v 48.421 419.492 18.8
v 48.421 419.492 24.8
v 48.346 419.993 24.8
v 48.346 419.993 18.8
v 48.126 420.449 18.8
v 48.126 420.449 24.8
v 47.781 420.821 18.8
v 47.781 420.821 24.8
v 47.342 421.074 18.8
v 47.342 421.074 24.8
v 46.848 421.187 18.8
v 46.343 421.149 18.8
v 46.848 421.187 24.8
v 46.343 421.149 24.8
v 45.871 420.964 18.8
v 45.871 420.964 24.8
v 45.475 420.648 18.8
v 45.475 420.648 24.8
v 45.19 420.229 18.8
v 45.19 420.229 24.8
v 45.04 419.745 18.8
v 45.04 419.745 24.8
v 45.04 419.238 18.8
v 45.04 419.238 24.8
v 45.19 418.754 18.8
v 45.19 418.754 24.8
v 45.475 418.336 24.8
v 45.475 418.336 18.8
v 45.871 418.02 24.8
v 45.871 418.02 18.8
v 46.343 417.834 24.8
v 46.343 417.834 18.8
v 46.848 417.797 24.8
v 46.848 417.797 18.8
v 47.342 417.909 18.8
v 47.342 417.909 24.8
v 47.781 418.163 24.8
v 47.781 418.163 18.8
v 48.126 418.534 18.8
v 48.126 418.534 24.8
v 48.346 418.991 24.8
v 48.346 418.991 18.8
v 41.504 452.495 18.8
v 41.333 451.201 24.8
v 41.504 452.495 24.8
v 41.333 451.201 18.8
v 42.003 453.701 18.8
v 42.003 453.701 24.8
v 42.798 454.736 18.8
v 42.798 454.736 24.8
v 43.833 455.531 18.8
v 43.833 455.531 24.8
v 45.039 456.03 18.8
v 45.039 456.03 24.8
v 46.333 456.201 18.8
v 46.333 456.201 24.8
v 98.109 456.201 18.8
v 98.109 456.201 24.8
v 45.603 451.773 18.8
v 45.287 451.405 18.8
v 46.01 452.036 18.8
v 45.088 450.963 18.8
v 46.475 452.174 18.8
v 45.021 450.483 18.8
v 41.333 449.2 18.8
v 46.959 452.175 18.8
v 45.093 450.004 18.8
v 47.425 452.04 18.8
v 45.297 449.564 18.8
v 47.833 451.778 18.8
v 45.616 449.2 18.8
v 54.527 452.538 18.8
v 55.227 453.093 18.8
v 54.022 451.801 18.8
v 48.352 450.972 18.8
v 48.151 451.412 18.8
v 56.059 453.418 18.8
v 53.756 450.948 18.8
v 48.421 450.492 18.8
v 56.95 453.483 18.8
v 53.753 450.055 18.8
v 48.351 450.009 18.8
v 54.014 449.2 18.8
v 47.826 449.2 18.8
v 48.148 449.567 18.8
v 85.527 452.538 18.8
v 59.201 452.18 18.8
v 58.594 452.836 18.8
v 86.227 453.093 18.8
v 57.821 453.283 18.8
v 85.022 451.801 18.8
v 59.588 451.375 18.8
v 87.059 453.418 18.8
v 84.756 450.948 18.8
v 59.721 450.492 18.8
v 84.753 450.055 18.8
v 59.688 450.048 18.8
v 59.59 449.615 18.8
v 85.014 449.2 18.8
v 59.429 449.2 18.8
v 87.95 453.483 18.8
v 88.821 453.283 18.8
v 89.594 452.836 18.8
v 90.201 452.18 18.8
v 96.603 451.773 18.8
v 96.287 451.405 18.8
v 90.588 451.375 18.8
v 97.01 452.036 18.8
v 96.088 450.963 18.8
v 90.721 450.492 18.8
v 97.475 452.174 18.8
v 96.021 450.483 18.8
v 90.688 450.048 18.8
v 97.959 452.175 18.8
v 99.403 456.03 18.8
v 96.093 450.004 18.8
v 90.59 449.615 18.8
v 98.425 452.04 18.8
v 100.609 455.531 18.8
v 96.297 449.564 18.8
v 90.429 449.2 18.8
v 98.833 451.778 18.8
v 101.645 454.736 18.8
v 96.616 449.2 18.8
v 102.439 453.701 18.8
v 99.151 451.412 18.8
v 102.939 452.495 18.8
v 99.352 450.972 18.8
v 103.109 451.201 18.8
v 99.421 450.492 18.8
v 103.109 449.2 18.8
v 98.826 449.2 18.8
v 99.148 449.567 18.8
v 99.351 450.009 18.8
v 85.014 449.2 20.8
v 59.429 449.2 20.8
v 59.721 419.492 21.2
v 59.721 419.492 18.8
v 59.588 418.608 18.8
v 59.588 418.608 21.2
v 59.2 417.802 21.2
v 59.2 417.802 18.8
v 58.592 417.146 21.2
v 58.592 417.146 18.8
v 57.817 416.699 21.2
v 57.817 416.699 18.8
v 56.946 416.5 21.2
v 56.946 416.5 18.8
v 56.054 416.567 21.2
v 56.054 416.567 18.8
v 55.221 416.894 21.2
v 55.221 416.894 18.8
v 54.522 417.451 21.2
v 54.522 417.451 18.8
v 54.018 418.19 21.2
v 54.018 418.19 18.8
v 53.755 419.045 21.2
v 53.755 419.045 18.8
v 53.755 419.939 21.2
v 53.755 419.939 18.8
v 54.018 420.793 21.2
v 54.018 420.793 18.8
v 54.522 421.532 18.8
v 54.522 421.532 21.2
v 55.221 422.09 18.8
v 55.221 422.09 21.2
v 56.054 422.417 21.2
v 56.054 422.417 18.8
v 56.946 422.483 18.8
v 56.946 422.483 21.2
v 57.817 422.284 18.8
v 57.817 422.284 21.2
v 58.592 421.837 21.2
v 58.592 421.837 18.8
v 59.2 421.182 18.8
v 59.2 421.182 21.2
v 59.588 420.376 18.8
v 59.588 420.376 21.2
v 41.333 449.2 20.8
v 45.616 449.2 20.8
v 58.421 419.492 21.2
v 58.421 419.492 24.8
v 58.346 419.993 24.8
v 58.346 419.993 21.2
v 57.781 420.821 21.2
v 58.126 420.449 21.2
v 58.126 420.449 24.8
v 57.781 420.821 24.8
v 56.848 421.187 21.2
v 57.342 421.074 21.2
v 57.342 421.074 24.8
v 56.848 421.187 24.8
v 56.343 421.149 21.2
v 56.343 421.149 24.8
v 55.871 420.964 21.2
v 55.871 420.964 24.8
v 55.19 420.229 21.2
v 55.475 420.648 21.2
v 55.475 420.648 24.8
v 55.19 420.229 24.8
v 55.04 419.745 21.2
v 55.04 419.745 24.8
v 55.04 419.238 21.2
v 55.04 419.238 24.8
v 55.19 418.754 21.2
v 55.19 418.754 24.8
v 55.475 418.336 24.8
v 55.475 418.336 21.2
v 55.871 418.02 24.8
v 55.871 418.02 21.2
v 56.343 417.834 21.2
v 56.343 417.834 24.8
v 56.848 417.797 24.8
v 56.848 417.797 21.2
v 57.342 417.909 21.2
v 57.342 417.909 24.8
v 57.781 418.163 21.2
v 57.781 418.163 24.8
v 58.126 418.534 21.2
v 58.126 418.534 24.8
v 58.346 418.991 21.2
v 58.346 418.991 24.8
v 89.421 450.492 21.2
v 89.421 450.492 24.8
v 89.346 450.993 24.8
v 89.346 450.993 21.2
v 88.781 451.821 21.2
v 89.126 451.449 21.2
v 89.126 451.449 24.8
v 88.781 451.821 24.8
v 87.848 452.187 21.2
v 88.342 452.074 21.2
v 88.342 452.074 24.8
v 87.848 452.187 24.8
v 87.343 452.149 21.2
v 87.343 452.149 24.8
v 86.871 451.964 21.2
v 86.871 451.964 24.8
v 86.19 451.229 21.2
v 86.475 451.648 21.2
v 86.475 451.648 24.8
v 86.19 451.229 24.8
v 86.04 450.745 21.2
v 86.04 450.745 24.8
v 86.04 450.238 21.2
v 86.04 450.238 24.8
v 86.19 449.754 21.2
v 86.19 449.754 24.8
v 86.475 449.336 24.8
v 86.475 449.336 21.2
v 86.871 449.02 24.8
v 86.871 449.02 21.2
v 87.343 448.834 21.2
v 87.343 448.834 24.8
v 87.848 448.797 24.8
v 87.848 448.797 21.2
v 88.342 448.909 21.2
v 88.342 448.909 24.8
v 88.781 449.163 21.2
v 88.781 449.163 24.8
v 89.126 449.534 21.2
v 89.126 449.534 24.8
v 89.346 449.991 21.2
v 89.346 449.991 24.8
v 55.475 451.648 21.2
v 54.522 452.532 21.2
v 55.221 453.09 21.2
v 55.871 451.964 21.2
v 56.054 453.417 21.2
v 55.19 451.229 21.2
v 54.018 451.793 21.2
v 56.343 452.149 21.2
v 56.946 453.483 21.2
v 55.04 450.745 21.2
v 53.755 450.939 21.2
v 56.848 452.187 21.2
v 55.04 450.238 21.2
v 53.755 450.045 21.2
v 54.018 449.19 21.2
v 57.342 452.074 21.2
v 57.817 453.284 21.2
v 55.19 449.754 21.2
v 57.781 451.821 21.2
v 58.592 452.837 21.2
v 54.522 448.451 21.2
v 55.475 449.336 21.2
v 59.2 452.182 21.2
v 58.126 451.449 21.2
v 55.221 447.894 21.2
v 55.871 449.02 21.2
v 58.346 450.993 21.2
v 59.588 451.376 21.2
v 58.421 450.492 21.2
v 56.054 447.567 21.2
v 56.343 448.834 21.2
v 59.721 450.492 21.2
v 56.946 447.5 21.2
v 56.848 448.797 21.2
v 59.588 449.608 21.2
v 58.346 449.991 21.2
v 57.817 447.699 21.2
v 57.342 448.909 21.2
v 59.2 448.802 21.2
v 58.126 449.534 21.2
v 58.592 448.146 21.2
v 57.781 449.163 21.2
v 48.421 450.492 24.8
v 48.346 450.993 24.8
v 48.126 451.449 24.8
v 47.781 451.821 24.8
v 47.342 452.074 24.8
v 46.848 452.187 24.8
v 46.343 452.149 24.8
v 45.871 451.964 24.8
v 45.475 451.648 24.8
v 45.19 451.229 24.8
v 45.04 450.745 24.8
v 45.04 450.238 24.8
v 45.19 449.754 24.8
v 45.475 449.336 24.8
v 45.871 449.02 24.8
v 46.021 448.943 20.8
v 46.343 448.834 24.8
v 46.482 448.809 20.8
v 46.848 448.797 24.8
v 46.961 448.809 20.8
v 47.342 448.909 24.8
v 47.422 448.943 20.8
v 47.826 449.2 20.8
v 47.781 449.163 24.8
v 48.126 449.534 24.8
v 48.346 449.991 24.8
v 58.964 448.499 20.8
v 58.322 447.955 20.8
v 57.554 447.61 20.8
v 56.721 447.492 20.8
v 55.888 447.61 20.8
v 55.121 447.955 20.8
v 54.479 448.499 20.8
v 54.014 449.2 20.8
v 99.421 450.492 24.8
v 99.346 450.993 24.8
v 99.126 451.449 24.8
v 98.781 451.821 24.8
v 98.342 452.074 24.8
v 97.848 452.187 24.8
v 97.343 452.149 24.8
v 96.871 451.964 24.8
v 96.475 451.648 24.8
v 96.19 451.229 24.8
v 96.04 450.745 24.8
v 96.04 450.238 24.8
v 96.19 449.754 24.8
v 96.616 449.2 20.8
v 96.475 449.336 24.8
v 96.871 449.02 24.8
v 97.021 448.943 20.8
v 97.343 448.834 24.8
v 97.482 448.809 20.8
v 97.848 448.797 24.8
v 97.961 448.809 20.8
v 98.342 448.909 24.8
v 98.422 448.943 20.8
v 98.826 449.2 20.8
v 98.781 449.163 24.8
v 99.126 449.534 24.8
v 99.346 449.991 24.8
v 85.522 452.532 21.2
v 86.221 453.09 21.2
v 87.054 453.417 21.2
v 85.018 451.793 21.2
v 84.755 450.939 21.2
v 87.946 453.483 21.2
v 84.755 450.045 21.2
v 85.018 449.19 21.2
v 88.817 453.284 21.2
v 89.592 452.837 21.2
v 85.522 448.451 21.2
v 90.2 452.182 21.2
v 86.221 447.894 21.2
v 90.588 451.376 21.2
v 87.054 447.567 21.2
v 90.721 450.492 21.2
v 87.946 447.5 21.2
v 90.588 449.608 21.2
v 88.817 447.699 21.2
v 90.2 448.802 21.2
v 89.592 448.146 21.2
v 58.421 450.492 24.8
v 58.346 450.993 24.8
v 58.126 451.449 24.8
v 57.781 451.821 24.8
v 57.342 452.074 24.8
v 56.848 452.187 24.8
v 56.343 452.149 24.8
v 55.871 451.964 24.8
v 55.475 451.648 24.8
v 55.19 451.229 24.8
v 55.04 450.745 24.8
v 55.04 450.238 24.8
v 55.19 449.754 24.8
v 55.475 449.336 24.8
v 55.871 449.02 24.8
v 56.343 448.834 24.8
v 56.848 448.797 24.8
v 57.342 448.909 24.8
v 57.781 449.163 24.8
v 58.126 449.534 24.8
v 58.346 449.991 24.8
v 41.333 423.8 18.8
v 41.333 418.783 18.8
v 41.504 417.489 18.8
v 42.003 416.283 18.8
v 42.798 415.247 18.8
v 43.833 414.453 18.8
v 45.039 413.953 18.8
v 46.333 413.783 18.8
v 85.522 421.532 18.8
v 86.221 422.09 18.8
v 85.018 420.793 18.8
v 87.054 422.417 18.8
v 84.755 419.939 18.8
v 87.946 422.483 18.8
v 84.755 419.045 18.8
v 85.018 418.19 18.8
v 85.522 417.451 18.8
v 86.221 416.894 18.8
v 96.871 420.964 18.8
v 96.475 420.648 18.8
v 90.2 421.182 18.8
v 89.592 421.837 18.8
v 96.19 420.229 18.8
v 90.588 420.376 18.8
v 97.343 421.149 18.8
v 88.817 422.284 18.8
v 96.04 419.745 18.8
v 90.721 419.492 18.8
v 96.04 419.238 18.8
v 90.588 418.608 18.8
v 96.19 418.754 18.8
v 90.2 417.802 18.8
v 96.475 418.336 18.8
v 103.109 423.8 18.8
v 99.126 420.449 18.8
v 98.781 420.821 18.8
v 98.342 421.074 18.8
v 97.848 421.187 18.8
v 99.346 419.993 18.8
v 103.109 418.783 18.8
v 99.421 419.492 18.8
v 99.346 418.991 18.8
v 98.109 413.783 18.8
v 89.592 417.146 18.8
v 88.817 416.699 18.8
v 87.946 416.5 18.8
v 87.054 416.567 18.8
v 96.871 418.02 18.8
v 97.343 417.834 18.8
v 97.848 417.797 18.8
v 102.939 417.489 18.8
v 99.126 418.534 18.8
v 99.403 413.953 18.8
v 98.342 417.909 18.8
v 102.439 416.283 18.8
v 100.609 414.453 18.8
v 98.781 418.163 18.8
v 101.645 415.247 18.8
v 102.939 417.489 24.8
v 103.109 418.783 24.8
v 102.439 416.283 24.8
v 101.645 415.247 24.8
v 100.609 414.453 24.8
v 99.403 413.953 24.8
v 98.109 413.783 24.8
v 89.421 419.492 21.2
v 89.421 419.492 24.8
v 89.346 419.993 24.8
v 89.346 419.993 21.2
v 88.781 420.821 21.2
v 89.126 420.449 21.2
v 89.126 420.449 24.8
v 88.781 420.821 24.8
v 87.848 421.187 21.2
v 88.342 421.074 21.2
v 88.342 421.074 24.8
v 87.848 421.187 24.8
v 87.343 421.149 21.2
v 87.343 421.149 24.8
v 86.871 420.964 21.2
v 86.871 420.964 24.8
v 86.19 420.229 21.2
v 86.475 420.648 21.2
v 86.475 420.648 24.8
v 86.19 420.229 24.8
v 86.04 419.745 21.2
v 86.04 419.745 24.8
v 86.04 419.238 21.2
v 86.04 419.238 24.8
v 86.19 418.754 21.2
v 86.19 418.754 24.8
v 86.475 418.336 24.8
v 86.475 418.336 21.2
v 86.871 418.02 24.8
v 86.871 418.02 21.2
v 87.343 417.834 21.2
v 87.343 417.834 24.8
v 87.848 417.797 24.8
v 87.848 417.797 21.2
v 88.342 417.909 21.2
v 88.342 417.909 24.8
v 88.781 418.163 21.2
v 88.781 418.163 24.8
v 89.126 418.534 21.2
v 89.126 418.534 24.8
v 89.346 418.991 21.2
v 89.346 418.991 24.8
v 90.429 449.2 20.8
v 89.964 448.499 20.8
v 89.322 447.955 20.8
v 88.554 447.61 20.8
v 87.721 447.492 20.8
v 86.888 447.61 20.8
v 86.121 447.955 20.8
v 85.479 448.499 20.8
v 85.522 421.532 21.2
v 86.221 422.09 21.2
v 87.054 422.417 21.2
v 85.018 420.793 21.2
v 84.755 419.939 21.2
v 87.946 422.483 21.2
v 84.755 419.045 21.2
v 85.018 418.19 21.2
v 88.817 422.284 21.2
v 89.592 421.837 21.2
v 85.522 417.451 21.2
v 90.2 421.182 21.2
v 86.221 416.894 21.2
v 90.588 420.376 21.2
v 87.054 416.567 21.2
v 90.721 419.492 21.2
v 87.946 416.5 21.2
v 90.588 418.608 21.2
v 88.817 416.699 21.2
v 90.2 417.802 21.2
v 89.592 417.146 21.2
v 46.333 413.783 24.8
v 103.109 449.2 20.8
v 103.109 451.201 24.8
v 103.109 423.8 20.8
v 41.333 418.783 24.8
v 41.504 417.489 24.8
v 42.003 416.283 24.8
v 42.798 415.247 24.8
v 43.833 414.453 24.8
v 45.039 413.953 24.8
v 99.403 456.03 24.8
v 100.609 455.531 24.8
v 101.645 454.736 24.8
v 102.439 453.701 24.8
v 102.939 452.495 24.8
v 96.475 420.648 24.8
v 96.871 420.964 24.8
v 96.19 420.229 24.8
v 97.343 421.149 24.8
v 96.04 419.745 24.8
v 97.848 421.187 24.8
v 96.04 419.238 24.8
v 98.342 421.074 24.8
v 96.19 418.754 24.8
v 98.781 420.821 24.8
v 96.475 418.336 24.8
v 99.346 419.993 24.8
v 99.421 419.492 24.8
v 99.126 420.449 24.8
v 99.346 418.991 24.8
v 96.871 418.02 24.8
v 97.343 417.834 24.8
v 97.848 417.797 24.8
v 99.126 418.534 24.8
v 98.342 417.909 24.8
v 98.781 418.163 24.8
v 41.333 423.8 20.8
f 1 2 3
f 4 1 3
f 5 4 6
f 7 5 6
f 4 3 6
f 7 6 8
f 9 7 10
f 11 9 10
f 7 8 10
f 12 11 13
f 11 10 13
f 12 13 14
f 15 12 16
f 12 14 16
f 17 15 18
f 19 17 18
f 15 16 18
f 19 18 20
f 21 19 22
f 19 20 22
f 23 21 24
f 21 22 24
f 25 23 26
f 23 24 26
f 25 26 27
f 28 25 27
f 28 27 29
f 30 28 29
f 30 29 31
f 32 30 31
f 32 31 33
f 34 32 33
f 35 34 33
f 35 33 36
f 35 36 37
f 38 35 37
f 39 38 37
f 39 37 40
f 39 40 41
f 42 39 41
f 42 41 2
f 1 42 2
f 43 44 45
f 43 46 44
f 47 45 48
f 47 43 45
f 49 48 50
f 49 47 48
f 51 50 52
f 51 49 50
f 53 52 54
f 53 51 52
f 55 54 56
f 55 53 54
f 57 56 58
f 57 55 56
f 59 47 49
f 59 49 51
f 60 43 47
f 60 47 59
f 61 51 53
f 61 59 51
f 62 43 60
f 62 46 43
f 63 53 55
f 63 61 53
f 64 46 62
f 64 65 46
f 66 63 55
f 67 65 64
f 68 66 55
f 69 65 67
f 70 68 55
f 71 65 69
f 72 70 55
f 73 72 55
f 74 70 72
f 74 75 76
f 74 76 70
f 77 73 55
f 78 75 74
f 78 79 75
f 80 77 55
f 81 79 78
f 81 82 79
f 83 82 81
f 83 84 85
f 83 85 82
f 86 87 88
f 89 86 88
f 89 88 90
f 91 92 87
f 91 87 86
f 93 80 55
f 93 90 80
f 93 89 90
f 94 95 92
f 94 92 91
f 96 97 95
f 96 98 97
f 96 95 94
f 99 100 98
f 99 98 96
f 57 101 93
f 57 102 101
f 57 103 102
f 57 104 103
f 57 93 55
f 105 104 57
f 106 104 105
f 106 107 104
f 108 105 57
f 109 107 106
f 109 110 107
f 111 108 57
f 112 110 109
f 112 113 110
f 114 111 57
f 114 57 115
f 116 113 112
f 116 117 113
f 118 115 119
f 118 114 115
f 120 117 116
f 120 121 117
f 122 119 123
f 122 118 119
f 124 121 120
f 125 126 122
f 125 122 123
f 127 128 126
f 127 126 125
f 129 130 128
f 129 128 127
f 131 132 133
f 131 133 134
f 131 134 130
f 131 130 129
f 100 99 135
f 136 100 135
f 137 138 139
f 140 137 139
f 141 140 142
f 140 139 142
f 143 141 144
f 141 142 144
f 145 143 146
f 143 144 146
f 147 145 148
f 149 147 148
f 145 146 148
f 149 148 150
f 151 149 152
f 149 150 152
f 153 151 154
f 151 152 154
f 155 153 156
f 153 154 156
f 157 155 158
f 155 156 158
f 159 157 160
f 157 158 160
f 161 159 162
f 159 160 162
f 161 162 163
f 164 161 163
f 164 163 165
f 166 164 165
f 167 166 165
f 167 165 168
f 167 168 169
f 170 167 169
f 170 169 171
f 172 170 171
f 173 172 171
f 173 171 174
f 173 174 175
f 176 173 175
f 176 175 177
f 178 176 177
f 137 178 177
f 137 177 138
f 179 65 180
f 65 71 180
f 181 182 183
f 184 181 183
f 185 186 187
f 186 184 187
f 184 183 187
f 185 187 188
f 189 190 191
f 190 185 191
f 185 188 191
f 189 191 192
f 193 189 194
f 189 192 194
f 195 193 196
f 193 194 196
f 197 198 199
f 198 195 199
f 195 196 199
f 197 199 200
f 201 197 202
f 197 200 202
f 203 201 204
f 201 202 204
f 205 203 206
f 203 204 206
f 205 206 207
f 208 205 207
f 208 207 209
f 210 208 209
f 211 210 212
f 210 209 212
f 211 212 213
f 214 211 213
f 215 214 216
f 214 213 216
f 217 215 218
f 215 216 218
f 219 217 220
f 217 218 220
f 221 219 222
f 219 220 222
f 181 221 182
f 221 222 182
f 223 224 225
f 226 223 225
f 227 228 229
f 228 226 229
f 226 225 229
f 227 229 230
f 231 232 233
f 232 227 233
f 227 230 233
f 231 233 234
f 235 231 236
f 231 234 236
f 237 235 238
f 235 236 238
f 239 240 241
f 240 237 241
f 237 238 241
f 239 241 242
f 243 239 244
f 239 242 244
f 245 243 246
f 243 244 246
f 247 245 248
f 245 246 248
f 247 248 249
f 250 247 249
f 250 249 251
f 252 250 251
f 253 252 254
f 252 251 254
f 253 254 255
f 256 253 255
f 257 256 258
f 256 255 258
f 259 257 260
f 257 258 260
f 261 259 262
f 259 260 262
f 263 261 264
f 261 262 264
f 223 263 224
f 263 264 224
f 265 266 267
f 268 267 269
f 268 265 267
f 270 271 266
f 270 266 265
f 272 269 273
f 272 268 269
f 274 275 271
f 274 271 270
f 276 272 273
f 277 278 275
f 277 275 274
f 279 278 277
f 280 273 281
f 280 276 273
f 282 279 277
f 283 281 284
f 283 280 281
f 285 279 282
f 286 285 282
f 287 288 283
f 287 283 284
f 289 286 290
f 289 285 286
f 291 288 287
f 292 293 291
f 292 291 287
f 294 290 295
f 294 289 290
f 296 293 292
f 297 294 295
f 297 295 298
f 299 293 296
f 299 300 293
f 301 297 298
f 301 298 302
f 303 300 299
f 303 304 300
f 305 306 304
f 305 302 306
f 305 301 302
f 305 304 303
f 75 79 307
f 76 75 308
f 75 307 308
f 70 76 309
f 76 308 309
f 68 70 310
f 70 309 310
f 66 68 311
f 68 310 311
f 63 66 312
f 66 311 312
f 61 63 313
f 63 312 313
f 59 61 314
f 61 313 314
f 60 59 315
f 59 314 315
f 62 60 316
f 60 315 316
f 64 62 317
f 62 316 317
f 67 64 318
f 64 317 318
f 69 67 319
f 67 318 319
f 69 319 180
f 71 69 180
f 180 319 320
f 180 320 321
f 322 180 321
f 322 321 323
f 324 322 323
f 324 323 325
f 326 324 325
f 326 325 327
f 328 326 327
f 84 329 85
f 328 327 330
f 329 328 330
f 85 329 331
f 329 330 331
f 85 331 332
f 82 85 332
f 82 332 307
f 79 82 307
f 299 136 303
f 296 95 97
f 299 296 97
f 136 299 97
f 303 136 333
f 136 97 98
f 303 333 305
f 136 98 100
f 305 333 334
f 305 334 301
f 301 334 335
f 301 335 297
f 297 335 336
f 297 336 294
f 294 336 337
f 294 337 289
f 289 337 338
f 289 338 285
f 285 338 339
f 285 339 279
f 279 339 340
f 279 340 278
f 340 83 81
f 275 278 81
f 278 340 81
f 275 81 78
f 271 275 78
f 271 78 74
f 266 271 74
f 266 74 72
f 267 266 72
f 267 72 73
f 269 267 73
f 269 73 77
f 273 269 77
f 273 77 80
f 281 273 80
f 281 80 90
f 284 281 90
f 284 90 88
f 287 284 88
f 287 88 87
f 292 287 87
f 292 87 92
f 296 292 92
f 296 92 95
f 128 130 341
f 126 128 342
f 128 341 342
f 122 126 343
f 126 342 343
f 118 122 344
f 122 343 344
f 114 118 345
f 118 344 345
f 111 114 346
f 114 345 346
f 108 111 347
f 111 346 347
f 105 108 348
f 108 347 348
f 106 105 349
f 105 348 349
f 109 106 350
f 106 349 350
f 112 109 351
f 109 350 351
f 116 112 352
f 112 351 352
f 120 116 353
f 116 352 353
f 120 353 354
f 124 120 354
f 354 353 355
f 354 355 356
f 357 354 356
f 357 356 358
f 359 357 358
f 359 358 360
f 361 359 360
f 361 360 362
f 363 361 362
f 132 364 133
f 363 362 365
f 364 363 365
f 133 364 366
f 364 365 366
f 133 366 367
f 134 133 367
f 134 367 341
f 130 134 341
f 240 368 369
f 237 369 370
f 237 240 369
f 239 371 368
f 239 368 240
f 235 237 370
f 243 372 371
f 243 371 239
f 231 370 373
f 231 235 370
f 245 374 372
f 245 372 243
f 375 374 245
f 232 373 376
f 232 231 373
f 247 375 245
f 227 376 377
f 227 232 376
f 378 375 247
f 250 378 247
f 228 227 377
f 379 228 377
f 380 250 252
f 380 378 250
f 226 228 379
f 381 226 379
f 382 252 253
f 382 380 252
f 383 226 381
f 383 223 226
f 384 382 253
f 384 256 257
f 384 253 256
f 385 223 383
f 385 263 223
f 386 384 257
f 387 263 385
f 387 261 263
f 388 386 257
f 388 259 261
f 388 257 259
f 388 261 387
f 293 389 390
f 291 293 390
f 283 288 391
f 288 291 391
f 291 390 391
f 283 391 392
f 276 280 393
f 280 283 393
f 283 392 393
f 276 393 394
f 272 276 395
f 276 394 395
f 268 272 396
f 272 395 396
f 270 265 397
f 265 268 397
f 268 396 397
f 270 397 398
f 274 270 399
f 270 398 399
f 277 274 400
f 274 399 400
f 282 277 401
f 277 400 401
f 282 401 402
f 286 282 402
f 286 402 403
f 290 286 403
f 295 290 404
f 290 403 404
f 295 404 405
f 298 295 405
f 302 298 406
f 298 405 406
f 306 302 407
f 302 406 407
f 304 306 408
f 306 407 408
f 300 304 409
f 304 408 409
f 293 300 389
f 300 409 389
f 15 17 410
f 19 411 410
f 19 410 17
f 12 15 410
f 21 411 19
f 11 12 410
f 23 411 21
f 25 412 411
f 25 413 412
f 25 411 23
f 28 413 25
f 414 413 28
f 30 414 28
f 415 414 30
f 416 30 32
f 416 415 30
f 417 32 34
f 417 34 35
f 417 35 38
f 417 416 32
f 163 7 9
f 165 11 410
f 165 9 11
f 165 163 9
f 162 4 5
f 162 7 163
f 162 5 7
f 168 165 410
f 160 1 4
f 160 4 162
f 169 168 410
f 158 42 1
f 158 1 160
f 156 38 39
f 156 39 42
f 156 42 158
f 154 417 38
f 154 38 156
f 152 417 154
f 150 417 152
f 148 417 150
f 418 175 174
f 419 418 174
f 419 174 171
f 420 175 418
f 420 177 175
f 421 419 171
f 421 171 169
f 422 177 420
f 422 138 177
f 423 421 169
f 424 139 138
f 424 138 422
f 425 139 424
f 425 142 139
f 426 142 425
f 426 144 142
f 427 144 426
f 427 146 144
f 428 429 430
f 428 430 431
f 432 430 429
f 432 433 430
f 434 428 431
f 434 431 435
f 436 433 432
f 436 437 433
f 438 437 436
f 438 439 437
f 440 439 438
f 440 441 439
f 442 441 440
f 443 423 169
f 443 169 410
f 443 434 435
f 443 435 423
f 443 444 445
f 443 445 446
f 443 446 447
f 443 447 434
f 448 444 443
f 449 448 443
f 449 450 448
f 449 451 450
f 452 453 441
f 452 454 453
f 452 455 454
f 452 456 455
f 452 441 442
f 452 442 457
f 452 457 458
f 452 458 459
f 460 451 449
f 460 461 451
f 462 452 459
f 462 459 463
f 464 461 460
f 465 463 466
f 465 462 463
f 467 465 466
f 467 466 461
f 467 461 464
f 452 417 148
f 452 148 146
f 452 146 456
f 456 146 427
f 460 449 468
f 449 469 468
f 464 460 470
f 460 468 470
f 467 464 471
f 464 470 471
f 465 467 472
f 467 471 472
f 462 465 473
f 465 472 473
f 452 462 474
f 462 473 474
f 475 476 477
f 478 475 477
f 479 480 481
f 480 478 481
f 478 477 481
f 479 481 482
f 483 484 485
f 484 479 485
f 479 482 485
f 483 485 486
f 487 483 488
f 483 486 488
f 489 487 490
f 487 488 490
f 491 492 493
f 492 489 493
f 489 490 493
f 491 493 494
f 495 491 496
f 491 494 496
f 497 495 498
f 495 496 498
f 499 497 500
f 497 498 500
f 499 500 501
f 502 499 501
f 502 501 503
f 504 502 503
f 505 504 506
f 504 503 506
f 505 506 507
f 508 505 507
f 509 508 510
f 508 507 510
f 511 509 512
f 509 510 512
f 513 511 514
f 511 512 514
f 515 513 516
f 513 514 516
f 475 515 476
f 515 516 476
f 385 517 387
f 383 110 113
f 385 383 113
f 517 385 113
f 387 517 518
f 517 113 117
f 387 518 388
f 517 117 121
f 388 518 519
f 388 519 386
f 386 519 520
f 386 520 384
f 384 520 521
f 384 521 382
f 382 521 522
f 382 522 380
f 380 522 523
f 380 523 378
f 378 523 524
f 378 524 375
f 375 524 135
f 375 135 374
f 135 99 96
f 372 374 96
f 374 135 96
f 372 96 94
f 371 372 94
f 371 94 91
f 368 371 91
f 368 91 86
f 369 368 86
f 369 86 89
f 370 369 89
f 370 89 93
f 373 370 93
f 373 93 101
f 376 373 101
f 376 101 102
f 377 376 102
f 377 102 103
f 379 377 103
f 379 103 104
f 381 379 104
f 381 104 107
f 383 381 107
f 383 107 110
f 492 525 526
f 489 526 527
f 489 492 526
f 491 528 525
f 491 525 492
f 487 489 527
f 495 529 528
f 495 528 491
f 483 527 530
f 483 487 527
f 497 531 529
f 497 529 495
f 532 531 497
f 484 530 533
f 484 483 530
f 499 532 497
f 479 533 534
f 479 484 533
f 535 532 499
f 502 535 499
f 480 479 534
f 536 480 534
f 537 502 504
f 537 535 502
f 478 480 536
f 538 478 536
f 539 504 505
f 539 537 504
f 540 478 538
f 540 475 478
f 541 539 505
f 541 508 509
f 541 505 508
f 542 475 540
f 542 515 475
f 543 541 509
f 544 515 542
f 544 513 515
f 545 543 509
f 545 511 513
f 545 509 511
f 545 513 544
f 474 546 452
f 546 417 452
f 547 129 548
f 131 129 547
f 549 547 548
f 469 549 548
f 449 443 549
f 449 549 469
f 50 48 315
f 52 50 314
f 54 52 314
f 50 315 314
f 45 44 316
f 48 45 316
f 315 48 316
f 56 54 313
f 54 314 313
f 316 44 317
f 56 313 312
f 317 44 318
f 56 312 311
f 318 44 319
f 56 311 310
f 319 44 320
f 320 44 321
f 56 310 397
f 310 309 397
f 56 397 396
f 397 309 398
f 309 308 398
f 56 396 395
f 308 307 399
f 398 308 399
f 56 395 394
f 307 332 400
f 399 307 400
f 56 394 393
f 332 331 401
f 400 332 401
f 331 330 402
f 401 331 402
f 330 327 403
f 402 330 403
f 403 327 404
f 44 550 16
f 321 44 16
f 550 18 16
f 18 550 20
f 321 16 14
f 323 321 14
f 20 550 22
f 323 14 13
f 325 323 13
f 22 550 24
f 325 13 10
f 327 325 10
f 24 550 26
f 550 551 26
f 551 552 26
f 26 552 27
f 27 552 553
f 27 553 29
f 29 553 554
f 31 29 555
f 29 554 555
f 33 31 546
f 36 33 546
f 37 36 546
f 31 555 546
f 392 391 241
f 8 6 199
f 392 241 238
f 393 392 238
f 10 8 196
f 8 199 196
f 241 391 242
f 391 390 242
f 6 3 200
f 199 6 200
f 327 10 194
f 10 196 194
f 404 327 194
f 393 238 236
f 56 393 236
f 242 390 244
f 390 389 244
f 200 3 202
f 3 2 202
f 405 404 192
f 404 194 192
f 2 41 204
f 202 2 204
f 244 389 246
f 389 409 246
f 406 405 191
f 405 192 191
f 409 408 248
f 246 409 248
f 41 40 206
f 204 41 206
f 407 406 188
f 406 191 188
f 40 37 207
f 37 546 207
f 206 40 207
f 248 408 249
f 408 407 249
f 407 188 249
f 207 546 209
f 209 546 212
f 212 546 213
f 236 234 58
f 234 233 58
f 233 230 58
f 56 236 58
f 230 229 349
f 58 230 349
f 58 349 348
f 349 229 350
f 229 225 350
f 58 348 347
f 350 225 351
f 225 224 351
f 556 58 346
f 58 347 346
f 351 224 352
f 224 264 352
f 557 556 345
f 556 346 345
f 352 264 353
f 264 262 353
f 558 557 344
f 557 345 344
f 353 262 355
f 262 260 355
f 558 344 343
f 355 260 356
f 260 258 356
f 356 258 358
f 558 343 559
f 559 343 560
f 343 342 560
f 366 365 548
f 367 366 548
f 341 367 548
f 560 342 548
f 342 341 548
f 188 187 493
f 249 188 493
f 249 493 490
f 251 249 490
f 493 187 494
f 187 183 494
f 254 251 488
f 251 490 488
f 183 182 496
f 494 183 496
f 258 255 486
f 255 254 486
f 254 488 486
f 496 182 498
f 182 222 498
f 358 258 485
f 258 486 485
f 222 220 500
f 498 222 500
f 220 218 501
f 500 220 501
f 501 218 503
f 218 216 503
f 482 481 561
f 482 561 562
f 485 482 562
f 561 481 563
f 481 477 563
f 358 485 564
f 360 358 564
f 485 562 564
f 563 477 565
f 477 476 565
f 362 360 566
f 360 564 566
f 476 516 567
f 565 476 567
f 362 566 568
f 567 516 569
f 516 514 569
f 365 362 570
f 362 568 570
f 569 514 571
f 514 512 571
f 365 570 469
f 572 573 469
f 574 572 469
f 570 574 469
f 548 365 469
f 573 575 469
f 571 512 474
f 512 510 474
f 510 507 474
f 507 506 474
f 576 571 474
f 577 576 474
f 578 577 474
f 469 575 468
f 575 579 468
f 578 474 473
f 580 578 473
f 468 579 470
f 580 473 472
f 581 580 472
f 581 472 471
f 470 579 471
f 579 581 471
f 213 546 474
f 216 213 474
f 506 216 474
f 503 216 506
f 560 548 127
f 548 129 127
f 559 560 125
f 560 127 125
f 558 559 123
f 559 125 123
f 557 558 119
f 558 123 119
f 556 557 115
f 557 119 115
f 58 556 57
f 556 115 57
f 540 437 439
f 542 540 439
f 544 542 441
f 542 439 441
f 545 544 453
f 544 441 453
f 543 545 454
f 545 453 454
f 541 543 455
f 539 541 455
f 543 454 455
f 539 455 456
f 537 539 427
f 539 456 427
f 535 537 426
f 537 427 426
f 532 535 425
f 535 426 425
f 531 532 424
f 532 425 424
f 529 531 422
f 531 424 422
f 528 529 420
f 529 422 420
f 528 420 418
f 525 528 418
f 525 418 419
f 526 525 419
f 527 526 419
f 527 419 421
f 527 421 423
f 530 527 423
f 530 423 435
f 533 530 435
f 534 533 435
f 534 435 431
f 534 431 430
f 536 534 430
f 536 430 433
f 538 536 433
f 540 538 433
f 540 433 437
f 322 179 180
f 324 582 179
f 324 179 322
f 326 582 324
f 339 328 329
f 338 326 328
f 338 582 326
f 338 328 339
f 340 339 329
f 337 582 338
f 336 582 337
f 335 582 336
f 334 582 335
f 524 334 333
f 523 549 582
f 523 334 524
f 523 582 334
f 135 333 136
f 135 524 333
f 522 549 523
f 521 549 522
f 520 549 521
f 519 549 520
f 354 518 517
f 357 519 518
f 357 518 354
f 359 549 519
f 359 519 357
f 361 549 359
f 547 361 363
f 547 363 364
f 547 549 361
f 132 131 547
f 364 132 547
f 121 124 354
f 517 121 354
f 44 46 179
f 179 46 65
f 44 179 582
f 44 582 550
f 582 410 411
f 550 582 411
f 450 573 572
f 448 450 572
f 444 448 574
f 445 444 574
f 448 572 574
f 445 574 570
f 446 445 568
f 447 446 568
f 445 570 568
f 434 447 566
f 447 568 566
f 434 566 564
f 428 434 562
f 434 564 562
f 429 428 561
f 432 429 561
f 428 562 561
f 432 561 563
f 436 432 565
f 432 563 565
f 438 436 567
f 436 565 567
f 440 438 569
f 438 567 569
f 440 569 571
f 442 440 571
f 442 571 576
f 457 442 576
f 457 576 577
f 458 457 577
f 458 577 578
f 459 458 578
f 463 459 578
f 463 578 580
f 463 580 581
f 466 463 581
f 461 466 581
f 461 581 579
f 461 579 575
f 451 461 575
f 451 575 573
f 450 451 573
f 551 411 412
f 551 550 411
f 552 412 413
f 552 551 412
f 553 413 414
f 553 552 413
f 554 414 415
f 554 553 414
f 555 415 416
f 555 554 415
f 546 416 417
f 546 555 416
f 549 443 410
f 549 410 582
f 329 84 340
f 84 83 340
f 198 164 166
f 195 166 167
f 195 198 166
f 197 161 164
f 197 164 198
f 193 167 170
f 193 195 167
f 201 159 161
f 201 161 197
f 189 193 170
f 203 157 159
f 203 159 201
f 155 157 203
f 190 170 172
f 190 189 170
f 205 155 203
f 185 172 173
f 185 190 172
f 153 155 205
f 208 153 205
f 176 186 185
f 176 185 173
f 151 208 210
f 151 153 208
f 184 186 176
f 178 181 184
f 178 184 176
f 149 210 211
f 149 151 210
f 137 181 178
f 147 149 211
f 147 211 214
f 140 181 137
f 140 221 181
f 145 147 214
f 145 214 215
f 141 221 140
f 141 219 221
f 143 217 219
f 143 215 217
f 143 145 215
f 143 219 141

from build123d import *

# Parameters (mm, degrees)
SKETCH_W            = 61.775986
SKETCH_H            = 42.418
PAD_DEPTH           = 2
PAD_DEPTH_BACK      = 4
SKETCH001_R         = 1.7
HOLE_DEPTH          = 25
HOLE001_D           = 3.4
HOLE001_DEPTH       = 25
HOLE001_CBORE_D     = 6
HOLE001_CBORE_DEPTH = 2.4
FILLET_R            = 5
SKETCH003_W         = 25.4
SKETCH003_H         = 4.354827
POCKET_DEPTH        = 61.776986


with BuildPart() as part:
    # Sketch (on Face4 of Binder) → Pad (new body, two sides)
    with BuildSketch(Plane(origin=(0, 0, 20.8), x_dir=(1, 0, 0), z_dir=(0, 0, -1))) as pad_sk:
        with Locations((72.221347, -434.991848)):
            Rectangle(SKETCH_W, SKETCH_H)
    extrude(amount=PAD_DEPTH)
    extrude(pad_sk.sketch, amount=-PAD_DEPTH_BACK)

    # Sketch001 (on Face5 of Pad) → Hole (cut)
    with BuildSketch(Plane.XY.offset(24.8)):
        with Locations((87.721347, 450.491848)):
            Circle(SKETCH001_R)
        with Locations((56.721347, 450.491848)):
            Circle(SKETCH001_R)
        with Locations((87.721347, 419.491848)):
            Circle(SKETCH001_R)
        with Locations((56.721347, 419.491848)):
            Circle(SKETCH001_R)
        with Locations((46.721347, 419.491848)):
            Circle(SKETCH001_R)
        with Locations((46.721347, 450.491848)):
            Circle(SKETCH001_R)
        with Locations((97.721347, 419.491848)):
            Circle(SKETCH001_R)
        with Locations((97.721347, 450.491848)):
            Circle(SKETCH001_R)
    extrude(amount=-HOLE_DEPTH, mode=Mode.SUBTRACT)

    # Hole001
    with Locations(Plane(origin=(0, 0, 18.8), x_dir=(1, 0, 0), z_dir=(0, 0, -1))):
        with Locations((56.721347, -419.491848), (87.721347, -419.491848), (87.721347, -450.491848), (56.721347, -450.491848)):
            CounterBoreHole(HOLE001_D / 2, HOLE001_CBORE_D / 2, HOLE001_CBORE_DEPTH, depth=HOLE001_DEPTH)

    # Fillet
    fillet_edges = [part.edges().sort_by_distance(p)[0] for p in [
        (41.333354, 413.782848, 21.8),
        (103.10934, 413.782848, 21.8),
        (103.10934, 456.200848, 21.8),
        (41.333354, 456.200848, 21.8),
    ]]
    fillet(fillet_edges, radius=FILLET_R)

    # Sketch003 (on Face7 of Fillet) → Pocket (cut, through all)
    with BuildSketch(Plane.YZ.offset(103.10934)):
        with Locations((436.5, 18.622587)):
            Rectangle(SKETCH003_W, SKETCH003_H)
    extrude(amount=-POCKET_DEPTH, mode=Mode.SUBTRACT)


solid = part.part
